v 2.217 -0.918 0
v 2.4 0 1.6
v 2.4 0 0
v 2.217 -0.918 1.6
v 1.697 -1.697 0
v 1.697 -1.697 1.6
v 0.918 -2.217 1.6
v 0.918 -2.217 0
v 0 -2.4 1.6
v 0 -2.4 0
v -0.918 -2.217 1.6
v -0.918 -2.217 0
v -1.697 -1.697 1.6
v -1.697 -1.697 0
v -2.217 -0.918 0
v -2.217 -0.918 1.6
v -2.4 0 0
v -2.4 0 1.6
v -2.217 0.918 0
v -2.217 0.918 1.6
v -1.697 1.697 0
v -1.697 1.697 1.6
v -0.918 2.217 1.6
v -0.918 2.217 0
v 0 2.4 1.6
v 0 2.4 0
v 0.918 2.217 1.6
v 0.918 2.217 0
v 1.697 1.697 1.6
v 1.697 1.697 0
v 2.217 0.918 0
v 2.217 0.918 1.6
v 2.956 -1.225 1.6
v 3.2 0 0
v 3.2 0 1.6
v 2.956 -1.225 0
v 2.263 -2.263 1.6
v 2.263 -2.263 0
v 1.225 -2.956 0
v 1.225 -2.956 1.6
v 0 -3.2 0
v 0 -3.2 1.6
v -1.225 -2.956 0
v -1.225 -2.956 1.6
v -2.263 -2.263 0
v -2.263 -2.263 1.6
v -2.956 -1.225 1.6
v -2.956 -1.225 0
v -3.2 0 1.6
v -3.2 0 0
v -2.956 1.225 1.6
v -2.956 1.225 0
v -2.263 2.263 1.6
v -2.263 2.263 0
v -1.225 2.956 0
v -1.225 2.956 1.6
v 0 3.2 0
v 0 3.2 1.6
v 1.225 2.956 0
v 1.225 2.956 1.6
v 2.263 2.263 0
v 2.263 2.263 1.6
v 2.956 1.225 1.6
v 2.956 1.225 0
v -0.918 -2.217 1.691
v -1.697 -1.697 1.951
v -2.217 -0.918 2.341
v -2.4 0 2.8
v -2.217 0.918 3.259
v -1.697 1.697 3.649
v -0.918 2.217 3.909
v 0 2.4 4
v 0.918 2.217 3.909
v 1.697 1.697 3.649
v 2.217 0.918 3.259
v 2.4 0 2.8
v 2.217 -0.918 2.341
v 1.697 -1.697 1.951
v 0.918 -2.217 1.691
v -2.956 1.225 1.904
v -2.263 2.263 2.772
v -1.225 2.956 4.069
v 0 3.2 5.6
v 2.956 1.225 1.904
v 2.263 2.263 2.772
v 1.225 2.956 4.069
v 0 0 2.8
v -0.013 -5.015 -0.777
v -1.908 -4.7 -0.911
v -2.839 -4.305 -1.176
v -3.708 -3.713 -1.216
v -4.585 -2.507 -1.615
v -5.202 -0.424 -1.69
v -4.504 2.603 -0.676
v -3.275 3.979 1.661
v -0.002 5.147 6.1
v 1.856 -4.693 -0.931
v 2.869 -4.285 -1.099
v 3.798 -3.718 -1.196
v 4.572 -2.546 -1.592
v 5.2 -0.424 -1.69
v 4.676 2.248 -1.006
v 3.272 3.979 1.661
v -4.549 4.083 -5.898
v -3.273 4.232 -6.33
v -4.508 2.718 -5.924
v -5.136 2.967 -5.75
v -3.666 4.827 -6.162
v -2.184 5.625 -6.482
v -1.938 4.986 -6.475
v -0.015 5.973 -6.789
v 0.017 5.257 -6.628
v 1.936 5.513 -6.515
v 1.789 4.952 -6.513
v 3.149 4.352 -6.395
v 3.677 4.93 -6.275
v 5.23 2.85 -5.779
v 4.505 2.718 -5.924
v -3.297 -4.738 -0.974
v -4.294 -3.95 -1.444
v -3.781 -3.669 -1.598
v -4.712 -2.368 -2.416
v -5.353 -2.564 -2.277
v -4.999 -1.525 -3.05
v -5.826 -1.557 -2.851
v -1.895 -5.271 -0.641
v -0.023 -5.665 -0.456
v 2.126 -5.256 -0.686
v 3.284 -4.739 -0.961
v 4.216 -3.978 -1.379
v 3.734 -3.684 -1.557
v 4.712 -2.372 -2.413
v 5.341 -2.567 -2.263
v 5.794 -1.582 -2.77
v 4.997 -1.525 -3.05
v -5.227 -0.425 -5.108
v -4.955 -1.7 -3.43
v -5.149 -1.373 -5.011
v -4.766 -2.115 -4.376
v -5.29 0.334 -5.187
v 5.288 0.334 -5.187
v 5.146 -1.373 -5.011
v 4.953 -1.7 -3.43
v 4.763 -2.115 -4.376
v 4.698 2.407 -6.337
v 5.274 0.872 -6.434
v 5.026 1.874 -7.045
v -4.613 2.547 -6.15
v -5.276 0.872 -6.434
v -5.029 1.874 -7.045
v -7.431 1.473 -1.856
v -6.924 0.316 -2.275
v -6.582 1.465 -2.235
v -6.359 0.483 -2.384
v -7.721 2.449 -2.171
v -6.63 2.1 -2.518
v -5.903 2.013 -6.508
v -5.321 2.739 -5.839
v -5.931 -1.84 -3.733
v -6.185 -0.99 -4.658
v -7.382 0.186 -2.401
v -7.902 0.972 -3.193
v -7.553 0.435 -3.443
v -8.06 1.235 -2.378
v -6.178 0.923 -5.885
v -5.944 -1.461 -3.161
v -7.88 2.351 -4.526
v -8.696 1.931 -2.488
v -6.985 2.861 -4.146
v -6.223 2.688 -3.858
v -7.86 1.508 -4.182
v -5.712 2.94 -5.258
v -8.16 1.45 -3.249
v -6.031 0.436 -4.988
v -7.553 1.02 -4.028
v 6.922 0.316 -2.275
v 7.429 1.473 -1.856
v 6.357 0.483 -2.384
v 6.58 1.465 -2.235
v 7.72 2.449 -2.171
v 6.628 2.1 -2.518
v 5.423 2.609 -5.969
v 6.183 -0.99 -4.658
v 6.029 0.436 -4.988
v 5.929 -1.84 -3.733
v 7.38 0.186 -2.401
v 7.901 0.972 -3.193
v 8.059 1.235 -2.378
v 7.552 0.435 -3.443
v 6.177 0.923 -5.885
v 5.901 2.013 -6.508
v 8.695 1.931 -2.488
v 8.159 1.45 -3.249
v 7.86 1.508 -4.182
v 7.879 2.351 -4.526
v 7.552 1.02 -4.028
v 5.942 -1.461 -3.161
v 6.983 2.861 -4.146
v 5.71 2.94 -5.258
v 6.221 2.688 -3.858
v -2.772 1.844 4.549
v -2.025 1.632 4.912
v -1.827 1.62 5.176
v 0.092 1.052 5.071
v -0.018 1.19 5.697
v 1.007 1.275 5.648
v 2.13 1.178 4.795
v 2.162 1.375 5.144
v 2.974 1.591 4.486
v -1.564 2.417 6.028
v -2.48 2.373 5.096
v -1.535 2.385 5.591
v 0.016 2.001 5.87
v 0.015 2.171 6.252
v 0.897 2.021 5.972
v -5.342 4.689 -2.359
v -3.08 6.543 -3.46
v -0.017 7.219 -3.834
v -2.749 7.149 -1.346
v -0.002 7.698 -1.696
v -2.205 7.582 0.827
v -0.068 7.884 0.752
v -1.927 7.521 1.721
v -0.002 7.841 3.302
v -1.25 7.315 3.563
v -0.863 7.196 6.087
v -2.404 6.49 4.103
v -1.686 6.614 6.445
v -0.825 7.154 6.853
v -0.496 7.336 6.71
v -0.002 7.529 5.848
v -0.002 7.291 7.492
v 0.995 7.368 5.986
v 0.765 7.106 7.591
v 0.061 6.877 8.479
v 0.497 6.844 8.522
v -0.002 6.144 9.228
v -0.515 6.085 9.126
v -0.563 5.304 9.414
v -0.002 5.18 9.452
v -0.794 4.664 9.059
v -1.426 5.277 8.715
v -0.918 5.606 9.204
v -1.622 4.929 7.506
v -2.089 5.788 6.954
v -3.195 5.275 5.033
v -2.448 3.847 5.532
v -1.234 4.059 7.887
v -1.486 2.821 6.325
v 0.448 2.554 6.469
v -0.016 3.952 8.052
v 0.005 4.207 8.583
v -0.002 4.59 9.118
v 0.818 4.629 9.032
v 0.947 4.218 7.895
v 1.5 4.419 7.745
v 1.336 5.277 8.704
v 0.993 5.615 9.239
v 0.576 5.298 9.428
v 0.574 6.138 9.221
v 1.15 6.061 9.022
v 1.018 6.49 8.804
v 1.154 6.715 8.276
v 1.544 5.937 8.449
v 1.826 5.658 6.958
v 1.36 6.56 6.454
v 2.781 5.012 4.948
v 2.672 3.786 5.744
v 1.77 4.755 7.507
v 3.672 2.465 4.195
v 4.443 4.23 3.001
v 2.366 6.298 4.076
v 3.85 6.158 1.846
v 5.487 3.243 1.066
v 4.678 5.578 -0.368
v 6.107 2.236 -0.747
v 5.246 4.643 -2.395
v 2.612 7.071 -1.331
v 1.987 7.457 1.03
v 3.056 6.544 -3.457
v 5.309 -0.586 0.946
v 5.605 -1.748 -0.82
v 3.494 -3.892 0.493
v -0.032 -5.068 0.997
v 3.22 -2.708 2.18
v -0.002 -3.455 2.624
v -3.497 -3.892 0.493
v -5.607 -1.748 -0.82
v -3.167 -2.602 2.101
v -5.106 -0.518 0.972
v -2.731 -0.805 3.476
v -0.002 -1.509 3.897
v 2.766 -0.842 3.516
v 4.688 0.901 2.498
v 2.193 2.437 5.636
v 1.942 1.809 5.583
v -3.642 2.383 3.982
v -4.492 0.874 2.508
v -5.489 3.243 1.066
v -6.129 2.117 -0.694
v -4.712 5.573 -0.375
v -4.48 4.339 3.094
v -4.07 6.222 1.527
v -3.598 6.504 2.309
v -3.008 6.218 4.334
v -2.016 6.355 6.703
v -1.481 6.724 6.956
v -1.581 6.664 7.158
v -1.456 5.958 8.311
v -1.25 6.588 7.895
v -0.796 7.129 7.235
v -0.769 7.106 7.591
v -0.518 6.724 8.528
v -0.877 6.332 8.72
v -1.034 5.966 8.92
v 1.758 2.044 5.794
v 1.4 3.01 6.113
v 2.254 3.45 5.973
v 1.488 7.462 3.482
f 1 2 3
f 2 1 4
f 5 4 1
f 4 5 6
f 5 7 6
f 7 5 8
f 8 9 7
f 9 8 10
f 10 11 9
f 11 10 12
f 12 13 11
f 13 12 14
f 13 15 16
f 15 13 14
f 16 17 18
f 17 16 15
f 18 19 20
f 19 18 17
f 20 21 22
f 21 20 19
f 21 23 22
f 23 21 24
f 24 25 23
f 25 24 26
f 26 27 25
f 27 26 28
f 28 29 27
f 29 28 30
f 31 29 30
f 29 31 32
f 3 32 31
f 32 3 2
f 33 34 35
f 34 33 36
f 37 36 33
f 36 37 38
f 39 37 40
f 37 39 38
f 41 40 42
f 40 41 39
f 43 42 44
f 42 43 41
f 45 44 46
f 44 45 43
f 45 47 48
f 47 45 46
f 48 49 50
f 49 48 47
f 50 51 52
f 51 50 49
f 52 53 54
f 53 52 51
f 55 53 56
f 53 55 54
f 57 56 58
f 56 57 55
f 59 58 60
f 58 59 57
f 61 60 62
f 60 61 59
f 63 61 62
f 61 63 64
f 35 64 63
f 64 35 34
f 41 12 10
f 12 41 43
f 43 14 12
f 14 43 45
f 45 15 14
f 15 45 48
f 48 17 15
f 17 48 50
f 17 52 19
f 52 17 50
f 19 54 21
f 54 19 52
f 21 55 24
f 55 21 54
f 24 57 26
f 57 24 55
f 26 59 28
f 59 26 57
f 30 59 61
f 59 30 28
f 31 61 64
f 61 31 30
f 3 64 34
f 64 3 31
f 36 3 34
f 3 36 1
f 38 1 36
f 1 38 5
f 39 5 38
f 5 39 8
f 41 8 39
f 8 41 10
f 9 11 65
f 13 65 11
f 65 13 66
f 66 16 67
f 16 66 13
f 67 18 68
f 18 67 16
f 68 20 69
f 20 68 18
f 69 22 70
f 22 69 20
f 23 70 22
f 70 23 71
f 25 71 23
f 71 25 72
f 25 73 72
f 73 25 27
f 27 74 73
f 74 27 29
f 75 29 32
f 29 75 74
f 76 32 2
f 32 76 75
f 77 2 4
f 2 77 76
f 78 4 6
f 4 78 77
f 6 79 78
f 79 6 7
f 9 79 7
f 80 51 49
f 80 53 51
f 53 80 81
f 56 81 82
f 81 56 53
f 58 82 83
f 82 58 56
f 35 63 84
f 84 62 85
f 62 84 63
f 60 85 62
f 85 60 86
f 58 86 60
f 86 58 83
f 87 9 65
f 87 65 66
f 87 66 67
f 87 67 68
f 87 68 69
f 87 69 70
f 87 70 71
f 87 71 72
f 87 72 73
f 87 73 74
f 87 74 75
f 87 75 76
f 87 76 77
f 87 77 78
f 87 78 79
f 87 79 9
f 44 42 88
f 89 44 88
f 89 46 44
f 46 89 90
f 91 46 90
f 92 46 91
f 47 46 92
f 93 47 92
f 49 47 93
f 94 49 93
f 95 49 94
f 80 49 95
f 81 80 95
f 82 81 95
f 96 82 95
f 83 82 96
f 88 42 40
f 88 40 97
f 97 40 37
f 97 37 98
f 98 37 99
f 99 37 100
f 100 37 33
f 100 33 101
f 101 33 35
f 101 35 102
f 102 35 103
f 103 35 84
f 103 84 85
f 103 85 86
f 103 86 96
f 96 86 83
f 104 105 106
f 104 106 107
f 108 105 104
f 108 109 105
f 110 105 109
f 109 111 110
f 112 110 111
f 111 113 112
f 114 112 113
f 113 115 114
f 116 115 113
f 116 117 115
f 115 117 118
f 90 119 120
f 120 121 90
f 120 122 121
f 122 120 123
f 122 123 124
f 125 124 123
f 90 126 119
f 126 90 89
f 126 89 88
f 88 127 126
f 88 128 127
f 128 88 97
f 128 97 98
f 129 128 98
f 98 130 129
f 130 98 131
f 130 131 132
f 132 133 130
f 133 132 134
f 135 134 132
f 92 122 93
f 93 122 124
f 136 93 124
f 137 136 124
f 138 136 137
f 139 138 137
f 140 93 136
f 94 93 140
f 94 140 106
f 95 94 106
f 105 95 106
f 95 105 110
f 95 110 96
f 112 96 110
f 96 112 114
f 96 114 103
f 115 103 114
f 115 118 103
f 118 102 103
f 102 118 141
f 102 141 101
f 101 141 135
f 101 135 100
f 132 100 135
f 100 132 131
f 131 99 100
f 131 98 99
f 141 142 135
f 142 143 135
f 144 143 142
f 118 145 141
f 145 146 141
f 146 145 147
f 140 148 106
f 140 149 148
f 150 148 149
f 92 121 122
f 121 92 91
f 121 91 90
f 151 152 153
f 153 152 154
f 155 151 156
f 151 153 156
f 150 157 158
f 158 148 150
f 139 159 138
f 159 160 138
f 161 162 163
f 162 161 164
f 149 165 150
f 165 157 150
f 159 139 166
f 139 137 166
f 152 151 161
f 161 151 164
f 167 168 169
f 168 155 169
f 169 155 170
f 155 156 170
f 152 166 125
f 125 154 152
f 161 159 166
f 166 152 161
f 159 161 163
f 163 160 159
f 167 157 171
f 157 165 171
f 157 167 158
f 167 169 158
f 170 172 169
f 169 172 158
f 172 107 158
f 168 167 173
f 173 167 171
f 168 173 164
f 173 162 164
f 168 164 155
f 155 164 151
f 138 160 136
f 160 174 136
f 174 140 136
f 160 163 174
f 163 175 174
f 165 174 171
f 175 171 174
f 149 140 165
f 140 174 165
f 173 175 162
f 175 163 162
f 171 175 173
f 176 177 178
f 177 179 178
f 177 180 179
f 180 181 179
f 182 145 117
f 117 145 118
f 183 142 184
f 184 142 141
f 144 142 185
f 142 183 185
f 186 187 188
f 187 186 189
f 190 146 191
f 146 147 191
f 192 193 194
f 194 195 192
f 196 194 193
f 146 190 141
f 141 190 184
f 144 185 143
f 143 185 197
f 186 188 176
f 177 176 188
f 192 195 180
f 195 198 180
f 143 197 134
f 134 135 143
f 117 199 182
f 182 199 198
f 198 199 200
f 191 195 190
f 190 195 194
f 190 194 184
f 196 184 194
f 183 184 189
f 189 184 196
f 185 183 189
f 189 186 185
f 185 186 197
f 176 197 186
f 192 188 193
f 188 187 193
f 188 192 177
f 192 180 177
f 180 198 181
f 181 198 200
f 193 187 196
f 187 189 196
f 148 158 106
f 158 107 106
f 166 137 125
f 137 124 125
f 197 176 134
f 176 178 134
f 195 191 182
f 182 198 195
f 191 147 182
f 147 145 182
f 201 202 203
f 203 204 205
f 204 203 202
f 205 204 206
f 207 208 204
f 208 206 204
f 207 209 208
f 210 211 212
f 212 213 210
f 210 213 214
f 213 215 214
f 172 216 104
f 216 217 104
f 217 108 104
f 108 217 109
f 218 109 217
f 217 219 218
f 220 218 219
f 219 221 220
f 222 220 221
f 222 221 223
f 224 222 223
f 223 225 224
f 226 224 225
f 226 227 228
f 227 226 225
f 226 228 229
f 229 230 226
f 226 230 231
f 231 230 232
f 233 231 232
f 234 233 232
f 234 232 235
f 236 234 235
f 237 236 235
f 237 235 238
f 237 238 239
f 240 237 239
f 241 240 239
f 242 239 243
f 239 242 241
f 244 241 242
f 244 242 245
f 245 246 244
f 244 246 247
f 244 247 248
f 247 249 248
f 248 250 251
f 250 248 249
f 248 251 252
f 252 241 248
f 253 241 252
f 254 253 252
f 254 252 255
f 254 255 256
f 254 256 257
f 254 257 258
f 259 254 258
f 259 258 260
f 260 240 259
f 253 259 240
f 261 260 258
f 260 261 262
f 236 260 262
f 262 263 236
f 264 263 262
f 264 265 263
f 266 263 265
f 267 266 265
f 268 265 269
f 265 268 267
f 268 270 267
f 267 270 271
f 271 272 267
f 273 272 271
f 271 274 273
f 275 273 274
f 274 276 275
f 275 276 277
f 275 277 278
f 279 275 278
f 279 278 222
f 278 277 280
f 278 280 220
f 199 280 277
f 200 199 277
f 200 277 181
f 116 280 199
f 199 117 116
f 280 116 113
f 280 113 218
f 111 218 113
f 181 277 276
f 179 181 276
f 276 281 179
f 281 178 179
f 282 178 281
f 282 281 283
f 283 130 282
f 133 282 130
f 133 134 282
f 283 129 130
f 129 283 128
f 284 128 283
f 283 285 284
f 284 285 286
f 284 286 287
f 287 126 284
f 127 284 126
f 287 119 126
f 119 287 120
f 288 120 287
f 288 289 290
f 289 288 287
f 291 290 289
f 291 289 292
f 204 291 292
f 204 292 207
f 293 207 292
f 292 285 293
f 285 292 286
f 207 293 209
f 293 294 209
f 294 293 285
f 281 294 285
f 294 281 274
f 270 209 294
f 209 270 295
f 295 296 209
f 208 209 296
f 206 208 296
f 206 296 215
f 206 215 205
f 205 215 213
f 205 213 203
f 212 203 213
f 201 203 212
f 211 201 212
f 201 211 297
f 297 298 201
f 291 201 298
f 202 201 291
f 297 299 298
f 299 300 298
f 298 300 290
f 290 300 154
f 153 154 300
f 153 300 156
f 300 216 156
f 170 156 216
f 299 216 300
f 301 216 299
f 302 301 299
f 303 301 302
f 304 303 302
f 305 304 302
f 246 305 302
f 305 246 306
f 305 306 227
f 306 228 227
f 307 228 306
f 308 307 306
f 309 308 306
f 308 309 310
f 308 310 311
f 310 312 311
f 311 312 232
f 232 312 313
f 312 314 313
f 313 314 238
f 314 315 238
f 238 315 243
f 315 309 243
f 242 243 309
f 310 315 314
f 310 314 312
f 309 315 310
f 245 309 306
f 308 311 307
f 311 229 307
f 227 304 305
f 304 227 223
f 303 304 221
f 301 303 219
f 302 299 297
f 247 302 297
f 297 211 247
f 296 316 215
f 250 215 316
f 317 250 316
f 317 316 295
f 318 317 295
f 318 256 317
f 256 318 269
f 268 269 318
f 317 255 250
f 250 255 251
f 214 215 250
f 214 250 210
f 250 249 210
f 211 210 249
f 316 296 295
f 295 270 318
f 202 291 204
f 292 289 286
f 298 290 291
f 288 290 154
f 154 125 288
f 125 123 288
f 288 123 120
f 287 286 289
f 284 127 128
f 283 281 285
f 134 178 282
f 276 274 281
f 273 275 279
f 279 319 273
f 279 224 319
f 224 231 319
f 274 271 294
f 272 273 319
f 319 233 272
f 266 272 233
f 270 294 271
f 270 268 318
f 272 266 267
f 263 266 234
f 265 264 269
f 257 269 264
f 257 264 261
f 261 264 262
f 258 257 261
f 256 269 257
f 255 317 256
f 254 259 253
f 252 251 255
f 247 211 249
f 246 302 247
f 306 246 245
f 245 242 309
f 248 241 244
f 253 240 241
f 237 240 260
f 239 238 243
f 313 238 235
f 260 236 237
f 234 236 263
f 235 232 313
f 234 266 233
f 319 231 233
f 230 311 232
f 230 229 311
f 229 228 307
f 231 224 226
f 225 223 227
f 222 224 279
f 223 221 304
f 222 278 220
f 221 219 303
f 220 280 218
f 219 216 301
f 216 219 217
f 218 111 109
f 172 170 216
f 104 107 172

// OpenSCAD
use <../lib.scad>
use <s/13787s01.scad>
use <s/13787s02.scad>
function ldraw_lib__13787p01() = [
// 0 Minifig Hat Elf with Pointy Ears with Bright Green Top Pattern
// 0 Name: 13787p01.dat
// 0 Author: Philippe Hurbain [Philo]
// 0 !LDRAW_ORG Part UPDATE 2014-02
// 0 !LICENSE Licensed under CC BY 2.0 and CC BY 4.0 : see CAreadme.txt
// 
// 0 BFC CERTIFY CCW
  [0,"BFC","CERTIFY"],
  [0,"BFC","CCW"],
// 
// 0 !CATEGORY Minifig Headwear
// 0 !KEYWORDS Christmas, Holiday
// 
// 0 !HISTORY 2014-09-26 {LEGO Digital Designer} Original part shape
// 0 !HISTORY 2014-09-26 [Philo] File preparation for LDraw Parts Tracker
// 0 !HISTORY 2014-12-23 [PTadmin] Official Update 2014-02
// 
// 
// 1 16 0 0 0 1 0 0 0 1 0 0 0 1 s\13787s01.dat
  [1,16,0,0,0,1,0,0,0,1,0,0,0,1, ldraw_lib__s__13787s01()],
// 1 10 0 0 0 1 0 0 0 1 0 0 0 1 s\13787s02.dat
  [1,10,0,0,0,1,0,0,0,1,0,0,0,1, ldraw_lib__s__13787s02()],
];
makepoly(ldraw_lib__13787p01(), line=0.2);
